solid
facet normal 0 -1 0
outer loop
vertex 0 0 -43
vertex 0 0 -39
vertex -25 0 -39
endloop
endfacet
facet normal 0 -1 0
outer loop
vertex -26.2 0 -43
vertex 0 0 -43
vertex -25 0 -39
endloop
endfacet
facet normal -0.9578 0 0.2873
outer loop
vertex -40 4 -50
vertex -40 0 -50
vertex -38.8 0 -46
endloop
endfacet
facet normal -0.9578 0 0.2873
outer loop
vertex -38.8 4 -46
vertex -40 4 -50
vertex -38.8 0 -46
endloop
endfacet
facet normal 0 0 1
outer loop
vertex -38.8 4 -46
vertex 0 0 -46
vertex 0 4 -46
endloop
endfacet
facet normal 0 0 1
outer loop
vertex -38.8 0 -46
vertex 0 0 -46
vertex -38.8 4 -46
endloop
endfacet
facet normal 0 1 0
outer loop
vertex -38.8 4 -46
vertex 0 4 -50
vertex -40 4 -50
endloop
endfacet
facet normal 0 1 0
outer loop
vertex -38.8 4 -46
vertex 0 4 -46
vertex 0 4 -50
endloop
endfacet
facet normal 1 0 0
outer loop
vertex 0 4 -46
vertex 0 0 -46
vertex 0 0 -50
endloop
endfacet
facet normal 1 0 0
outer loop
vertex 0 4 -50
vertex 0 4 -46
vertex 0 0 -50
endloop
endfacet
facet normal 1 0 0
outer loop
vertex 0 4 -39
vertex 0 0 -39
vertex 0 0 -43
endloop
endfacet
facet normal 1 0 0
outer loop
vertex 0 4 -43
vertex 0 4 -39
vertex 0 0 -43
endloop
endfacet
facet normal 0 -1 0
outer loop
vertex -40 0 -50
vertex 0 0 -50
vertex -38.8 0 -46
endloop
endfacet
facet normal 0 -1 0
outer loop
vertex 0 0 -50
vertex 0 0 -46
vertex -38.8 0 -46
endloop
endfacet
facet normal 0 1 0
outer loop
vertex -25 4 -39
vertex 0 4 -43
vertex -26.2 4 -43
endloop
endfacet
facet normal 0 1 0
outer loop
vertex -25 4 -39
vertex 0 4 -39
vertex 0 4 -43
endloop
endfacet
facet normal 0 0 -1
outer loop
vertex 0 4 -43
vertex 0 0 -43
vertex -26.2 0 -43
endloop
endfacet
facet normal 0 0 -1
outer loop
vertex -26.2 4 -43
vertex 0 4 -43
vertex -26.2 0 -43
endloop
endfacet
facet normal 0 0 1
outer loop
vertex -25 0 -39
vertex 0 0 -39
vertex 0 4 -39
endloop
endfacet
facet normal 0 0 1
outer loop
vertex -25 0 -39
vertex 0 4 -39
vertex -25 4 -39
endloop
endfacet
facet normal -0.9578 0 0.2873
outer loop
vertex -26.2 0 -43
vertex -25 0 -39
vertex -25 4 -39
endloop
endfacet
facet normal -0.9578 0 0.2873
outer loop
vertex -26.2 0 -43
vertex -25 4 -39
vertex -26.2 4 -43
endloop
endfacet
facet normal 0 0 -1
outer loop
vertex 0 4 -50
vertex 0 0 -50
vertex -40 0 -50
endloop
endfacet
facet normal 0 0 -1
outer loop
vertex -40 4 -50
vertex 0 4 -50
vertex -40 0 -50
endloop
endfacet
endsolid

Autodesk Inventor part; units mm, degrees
ref_plane "YZ Plane" through (0, 0, 0) normal (1, 0, 0) x (0, 1, 0)
ref_plane "XZ Plane" through (0, 0, 0) normal (0, 1, 0) x (-1, 0, 0)
ref_plane "XY Plane" through (0, 0, 0) normal (0, 0, 1) x (1, 0, 0)
sketch "Skizze1" plane through (0, 0, 0) normal (0, 1, 0) x (-1, 0, 0)
  line L0 (0, 0) -> (25, 0)
  line L1 (0, 0) -> (0, -50)
  line L2 (0, -50) -> (40, -50)
  line L3 (40, -50) -> (25, 0)
  line L4 (0, 0) -> (0, -4)
  line L5 (0, -4) -> (26.2, -4)
  line L6 (0, -50) -> (0, -46)
  line L7 (0, -46) -> (38.8, -46)
  line L8 (26.2, -4) -> (26.2, -46)
  line L9 (0, -46) -> (0, -43)
  line L10 (0, -43) -> (26.2, -43)
  line L11 (0, -43) -> (0, -39)
  line L12 (0, -39) -> (25, -39)
  line L13 (25, -39) -> (26.2, -43)
  dimension "d0" = 25
  dimension "d1" = 50
  dimension "d2" = 40
  dimension "d3" = 90
  dimension "d4" = 4
  dimension "d5" = 4
  dimension "d6" = 3
  dimension "d7" = 4
  dimension "d8" = 25
  dimension "d9" = 106.699
  dimension "d10" = 106.699
extrude "Extrusion1" add sketch "Skizze1" along normal blind 4 contours L12 L13 L10 L1 | L3 L2 L1 L7
equation "\"Biegeradius\" = Stärke"
equation "\"BreiteBiegungsfreistellung\" = Stärke"
equation "\"TiefeBiegungsfreistellung\" = 0.5 * Stärke"
equation "\"GrößeEckenfreistellung\" = 4 * Stärke"
equation "\"MinimalRest\" = 2 * Stärke"
equation "\"Übergangsradius\" = Biegeradius"
equation "\"JacobiRadiusGröße\" = Biegeradius"
equation "\"Abstandsgröße\" = Stärke"
equation "\"Stärke\" = 0.5"
properties part number "Bedienfeld_Fuesse"
